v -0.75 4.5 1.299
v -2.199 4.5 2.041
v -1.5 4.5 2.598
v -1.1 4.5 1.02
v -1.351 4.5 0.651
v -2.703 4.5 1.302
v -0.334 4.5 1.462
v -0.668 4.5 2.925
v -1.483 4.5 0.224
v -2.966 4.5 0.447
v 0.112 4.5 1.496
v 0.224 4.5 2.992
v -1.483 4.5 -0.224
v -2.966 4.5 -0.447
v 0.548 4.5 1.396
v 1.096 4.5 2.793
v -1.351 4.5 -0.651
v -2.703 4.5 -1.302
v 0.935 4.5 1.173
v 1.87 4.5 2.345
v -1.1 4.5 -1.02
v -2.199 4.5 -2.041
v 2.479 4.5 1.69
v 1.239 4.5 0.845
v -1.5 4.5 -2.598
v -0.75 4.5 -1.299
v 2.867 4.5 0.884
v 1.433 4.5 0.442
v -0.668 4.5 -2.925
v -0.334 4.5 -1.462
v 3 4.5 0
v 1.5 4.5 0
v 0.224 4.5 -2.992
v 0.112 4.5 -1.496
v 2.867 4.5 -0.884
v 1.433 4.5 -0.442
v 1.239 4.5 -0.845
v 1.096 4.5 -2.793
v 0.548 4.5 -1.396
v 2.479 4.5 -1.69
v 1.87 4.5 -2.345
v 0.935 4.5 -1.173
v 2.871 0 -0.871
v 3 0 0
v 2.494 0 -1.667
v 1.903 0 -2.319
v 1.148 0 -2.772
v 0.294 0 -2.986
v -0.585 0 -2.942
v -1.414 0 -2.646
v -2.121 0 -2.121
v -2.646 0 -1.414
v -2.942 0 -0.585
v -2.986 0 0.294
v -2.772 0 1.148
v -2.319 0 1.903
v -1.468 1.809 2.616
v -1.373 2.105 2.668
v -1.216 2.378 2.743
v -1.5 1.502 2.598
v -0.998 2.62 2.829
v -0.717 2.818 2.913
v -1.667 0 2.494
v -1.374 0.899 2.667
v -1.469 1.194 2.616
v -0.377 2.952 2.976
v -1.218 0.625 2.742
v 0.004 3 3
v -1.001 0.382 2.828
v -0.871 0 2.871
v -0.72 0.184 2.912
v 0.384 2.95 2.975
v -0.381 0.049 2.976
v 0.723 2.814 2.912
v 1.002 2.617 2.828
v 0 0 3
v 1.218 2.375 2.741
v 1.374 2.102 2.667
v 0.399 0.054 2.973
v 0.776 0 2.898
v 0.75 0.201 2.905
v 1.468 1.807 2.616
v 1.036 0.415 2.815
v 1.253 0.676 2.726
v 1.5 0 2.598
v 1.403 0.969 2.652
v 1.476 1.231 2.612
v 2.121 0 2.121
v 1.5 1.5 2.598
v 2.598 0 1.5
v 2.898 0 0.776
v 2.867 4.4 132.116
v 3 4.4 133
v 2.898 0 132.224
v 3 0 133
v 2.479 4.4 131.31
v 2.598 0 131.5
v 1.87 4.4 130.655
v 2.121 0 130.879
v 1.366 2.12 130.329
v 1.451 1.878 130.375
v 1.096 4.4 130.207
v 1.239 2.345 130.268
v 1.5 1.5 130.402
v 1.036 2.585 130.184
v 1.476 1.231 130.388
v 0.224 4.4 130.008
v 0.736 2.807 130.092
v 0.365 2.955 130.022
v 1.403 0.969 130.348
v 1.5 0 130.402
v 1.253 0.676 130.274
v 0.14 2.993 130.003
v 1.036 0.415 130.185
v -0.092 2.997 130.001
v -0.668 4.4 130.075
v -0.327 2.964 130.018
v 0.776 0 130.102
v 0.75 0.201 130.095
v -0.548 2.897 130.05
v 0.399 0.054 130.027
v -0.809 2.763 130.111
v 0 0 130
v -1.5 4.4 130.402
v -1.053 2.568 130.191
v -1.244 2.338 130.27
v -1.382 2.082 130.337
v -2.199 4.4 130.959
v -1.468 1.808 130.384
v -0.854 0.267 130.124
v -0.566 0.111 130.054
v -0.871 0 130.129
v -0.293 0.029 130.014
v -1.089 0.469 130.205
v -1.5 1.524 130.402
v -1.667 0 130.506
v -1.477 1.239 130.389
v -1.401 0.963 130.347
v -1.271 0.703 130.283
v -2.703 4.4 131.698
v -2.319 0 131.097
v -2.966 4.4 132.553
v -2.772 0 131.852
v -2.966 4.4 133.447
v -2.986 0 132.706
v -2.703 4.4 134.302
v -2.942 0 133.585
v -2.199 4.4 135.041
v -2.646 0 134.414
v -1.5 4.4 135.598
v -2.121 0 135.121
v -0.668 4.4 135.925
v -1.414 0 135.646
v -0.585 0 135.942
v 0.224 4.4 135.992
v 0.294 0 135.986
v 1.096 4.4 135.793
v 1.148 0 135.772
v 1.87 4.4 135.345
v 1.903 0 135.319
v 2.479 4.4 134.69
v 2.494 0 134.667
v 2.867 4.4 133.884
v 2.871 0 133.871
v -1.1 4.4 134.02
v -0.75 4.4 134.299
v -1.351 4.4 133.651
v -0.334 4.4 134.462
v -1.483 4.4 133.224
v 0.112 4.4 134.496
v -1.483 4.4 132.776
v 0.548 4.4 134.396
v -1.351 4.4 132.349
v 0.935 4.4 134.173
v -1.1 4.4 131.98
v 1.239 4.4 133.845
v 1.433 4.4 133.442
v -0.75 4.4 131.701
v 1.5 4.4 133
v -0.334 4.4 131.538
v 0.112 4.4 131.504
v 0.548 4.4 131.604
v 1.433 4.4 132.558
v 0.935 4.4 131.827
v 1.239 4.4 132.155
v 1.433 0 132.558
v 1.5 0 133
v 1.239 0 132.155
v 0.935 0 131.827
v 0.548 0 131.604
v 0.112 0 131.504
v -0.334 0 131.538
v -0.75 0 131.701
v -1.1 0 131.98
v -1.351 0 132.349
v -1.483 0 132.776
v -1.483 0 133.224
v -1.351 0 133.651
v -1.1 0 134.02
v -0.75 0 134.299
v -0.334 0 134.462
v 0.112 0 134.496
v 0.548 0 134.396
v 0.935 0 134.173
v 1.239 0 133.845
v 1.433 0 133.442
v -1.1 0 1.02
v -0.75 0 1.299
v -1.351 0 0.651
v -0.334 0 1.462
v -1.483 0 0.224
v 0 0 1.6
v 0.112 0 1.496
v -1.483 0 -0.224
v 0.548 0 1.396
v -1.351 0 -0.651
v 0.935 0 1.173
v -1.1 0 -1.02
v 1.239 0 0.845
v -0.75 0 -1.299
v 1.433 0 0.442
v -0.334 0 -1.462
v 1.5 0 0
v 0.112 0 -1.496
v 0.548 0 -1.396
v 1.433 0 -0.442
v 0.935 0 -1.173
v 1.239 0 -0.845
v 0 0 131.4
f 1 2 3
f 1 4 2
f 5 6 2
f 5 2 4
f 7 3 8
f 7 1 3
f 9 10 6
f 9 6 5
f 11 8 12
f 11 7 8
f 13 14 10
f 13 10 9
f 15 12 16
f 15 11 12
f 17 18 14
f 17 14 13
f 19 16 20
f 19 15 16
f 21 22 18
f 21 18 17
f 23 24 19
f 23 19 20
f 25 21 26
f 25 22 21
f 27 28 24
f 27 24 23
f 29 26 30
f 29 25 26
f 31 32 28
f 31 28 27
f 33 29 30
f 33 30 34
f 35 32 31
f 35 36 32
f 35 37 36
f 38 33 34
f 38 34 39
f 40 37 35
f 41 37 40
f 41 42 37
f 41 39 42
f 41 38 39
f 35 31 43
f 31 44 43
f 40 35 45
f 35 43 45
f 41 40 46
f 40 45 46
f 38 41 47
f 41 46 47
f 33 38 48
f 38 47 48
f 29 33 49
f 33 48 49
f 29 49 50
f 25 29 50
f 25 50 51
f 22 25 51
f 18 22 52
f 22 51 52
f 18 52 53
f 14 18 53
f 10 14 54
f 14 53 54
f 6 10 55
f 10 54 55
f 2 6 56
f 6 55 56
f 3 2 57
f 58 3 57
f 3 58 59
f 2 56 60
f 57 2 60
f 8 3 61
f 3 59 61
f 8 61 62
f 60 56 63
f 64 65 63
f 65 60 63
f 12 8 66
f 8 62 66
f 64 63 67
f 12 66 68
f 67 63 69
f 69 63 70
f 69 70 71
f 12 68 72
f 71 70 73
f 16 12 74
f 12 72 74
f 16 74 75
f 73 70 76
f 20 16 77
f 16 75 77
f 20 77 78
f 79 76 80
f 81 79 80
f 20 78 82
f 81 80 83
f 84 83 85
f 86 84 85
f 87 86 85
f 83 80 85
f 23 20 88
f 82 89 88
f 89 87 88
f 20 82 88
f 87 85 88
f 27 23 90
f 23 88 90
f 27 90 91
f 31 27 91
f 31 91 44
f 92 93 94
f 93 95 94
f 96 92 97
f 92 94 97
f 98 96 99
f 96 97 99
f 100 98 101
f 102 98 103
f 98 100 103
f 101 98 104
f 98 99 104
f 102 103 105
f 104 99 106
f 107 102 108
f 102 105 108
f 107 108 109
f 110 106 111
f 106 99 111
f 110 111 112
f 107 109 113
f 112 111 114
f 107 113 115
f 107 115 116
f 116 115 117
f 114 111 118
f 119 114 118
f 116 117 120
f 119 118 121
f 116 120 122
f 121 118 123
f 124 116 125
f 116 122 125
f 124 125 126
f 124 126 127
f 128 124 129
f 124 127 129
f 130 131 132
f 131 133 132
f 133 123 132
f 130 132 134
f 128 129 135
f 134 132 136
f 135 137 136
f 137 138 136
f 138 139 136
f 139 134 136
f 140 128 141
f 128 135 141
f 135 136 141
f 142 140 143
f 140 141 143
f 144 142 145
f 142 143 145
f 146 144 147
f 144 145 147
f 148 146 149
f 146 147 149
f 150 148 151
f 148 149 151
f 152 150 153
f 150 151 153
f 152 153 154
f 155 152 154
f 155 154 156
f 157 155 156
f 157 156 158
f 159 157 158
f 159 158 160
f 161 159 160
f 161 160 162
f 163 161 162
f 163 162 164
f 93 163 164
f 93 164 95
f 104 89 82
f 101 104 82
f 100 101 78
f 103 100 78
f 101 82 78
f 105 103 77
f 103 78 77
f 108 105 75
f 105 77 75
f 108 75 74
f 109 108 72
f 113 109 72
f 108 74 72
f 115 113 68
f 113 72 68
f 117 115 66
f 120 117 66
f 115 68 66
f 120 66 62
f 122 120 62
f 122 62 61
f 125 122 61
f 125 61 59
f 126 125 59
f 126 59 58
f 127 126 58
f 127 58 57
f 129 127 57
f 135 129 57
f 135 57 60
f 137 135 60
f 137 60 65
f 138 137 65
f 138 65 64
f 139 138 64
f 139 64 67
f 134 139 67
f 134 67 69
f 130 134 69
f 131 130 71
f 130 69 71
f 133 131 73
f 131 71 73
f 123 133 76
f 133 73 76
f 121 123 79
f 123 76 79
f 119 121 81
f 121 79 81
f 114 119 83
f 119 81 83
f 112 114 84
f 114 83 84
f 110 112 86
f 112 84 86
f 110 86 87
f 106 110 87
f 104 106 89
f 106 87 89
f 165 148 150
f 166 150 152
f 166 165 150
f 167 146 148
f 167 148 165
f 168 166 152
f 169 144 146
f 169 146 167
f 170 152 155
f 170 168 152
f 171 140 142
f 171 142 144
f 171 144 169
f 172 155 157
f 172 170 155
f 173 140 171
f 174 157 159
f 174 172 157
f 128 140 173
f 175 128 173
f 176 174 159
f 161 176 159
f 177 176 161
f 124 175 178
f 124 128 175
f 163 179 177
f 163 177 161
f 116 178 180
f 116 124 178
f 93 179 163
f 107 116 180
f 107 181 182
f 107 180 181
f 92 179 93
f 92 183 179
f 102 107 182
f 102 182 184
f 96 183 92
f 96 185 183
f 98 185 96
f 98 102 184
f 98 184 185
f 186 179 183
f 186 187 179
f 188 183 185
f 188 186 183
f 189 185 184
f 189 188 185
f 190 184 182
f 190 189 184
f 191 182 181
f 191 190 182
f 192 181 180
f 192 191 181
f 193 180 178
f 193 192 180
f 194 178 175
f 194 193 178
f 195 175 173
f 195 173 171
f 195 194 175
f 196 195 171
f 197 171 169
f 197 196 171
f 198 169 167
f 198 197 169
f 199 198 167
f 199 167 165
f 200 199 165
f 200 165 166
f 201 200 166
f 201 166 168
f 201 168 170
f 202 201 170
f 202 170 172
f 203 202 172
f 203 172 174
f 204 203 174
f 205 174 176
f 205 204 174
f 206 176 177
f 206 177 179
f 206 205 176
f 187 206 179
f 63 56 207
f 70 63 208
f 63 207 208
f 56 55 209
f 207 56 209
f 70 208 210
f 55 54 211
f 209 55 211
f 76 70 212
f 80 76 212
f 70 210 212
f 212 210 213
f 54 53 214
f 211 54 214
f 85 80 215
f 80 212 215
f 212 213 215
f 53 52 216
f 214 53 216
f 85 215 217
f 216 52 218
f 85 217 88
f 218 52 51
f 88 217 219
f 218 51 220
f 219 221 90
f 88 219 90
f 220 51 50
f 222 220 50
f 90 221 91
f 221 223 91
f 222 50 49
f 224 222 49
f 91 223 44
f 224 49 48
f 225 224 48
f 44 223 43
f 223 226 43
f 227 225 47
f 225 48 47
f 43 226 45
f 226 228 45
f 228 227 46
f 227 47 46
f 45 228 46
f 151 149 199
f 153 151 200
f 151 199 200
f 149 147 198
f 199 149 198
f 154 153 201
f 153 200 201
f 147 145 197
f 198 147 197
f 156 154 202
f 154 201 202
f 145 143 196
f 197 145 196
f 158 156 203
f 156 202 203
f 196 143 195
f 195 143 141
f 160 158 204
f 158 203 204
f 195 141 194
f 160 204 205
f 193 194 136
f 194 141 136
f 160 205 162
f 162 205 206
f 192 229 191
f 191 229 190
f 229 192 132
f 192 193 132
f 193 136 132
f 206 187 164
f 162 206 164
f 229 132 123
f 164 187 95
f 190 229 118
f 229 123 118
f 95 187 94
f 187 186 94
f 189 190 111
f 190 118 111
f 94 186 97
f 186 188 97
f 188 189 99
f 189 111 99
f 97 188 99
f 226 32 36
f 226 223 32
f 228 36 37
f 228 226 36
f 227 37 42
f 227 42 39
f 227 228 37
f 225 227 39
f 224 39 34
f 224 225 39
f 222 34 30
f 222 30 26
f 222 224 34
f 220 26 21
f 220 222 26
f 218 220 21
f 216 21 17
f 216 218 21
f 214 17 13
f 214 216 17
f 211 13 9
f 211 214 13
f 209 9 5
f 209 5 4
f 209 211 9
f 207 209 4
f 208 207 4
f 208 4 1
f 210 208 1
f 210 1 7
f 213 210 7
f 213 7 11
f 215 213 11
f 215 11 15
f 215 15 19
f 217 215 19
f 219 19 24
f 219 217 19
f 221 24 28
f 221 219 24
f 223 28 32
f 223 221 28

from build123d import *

# Parameters (mm, degrees)
SKETCH_1_R        = 3
SKETCH_1_R_2      = 1.5
EXTRUDE_1_DEPTH   = 3
EXTRUDE_1_2_DEPTH = 3
SKETCH_2_R        = 1.5
EXTRUDE_2_DEPTH   = 129.8
SKETCH_3_R        = 3
SKETCH_3_R_2      = 1.5
EXTRUDE_3_DEPTH   = 1.5
SKETCH_4_R        = 3
SKETCH_4_R_2      = 1.5
EXTRUDE_4_DEPTH   = 1.4


with BuildPart() as part:
    # 草图1 → 凸台-拉伸1 (new body)
    with BuildSketch(Plane(origin=(0, 0, 0), x_dir=(1, 0, 0), z_dir=(0, 1, 0))):
        Circle(SKETCH_1_R)
        Circle(SKETCH_1_R_2, mode=Mode.SUBTRACT)
    extrude(amount=EXTRUDE_1_DEPTH)



with BuildPart() as body_2:
    # 草图1 → Extrude 1 2 (new body)
    with BuildSketch(Plane(origin=(0, 0, 0), x_dir=(1, 0, 0), z_dir=(0, 1, 0))):
        with Locations((0, -133)):
            Circle(SKETCH_1_R)
        with Locations((0, -133)):
            Circle(SKETCH_1_R_2, mode=Mode.SUBTRACT)
    extrude(amount=EXTRUDE_1_2_DEPTH)


with BuildPart() as part_1:
    add(part.part)

    add(body_2.part)  # 凸台-拉伸2 merges body 2
    # 草图2 → 凸台-拉伸2 (add)
    with BuildSketch(Plane.XY.offset(1.6)):
        with Locations((0, 1.5)):
            Circle(SKETCH_2_R)
    extrude(amount=EXTRUDE_2_DEPTH)

    # 草图3 → 凸台-拉伸3 (add)
    with BuildSketch(Plane(origin=(0, 3, 0), x_dir=(1, 0, 0), z_dir=(0, 1, 0))):
        Circle(SKETCH_3_R)
        Circle(SKETCH_3_R_2, mode=Mode.SUBTRACT)
    extrude(amount=EXTRUDE_3_DEPTH)

    # 草图4 → 凸台-拉伸4 (add)
    with BuildSketch(Plane(origin=(0, 3, 0), x_dir=(1, 0, 0), z_dir=(0, 1, 0))):
        with Locations((0, -133)):
            Circle(SKETCH_4_R)
        with Locations((0, -133)):
            Circle(SKETCH_4_R_2, mode=Mode.SUBTRACT)
    extrude(amount=EXTRUDE_4_DEPTH)


solid = part_1.part
